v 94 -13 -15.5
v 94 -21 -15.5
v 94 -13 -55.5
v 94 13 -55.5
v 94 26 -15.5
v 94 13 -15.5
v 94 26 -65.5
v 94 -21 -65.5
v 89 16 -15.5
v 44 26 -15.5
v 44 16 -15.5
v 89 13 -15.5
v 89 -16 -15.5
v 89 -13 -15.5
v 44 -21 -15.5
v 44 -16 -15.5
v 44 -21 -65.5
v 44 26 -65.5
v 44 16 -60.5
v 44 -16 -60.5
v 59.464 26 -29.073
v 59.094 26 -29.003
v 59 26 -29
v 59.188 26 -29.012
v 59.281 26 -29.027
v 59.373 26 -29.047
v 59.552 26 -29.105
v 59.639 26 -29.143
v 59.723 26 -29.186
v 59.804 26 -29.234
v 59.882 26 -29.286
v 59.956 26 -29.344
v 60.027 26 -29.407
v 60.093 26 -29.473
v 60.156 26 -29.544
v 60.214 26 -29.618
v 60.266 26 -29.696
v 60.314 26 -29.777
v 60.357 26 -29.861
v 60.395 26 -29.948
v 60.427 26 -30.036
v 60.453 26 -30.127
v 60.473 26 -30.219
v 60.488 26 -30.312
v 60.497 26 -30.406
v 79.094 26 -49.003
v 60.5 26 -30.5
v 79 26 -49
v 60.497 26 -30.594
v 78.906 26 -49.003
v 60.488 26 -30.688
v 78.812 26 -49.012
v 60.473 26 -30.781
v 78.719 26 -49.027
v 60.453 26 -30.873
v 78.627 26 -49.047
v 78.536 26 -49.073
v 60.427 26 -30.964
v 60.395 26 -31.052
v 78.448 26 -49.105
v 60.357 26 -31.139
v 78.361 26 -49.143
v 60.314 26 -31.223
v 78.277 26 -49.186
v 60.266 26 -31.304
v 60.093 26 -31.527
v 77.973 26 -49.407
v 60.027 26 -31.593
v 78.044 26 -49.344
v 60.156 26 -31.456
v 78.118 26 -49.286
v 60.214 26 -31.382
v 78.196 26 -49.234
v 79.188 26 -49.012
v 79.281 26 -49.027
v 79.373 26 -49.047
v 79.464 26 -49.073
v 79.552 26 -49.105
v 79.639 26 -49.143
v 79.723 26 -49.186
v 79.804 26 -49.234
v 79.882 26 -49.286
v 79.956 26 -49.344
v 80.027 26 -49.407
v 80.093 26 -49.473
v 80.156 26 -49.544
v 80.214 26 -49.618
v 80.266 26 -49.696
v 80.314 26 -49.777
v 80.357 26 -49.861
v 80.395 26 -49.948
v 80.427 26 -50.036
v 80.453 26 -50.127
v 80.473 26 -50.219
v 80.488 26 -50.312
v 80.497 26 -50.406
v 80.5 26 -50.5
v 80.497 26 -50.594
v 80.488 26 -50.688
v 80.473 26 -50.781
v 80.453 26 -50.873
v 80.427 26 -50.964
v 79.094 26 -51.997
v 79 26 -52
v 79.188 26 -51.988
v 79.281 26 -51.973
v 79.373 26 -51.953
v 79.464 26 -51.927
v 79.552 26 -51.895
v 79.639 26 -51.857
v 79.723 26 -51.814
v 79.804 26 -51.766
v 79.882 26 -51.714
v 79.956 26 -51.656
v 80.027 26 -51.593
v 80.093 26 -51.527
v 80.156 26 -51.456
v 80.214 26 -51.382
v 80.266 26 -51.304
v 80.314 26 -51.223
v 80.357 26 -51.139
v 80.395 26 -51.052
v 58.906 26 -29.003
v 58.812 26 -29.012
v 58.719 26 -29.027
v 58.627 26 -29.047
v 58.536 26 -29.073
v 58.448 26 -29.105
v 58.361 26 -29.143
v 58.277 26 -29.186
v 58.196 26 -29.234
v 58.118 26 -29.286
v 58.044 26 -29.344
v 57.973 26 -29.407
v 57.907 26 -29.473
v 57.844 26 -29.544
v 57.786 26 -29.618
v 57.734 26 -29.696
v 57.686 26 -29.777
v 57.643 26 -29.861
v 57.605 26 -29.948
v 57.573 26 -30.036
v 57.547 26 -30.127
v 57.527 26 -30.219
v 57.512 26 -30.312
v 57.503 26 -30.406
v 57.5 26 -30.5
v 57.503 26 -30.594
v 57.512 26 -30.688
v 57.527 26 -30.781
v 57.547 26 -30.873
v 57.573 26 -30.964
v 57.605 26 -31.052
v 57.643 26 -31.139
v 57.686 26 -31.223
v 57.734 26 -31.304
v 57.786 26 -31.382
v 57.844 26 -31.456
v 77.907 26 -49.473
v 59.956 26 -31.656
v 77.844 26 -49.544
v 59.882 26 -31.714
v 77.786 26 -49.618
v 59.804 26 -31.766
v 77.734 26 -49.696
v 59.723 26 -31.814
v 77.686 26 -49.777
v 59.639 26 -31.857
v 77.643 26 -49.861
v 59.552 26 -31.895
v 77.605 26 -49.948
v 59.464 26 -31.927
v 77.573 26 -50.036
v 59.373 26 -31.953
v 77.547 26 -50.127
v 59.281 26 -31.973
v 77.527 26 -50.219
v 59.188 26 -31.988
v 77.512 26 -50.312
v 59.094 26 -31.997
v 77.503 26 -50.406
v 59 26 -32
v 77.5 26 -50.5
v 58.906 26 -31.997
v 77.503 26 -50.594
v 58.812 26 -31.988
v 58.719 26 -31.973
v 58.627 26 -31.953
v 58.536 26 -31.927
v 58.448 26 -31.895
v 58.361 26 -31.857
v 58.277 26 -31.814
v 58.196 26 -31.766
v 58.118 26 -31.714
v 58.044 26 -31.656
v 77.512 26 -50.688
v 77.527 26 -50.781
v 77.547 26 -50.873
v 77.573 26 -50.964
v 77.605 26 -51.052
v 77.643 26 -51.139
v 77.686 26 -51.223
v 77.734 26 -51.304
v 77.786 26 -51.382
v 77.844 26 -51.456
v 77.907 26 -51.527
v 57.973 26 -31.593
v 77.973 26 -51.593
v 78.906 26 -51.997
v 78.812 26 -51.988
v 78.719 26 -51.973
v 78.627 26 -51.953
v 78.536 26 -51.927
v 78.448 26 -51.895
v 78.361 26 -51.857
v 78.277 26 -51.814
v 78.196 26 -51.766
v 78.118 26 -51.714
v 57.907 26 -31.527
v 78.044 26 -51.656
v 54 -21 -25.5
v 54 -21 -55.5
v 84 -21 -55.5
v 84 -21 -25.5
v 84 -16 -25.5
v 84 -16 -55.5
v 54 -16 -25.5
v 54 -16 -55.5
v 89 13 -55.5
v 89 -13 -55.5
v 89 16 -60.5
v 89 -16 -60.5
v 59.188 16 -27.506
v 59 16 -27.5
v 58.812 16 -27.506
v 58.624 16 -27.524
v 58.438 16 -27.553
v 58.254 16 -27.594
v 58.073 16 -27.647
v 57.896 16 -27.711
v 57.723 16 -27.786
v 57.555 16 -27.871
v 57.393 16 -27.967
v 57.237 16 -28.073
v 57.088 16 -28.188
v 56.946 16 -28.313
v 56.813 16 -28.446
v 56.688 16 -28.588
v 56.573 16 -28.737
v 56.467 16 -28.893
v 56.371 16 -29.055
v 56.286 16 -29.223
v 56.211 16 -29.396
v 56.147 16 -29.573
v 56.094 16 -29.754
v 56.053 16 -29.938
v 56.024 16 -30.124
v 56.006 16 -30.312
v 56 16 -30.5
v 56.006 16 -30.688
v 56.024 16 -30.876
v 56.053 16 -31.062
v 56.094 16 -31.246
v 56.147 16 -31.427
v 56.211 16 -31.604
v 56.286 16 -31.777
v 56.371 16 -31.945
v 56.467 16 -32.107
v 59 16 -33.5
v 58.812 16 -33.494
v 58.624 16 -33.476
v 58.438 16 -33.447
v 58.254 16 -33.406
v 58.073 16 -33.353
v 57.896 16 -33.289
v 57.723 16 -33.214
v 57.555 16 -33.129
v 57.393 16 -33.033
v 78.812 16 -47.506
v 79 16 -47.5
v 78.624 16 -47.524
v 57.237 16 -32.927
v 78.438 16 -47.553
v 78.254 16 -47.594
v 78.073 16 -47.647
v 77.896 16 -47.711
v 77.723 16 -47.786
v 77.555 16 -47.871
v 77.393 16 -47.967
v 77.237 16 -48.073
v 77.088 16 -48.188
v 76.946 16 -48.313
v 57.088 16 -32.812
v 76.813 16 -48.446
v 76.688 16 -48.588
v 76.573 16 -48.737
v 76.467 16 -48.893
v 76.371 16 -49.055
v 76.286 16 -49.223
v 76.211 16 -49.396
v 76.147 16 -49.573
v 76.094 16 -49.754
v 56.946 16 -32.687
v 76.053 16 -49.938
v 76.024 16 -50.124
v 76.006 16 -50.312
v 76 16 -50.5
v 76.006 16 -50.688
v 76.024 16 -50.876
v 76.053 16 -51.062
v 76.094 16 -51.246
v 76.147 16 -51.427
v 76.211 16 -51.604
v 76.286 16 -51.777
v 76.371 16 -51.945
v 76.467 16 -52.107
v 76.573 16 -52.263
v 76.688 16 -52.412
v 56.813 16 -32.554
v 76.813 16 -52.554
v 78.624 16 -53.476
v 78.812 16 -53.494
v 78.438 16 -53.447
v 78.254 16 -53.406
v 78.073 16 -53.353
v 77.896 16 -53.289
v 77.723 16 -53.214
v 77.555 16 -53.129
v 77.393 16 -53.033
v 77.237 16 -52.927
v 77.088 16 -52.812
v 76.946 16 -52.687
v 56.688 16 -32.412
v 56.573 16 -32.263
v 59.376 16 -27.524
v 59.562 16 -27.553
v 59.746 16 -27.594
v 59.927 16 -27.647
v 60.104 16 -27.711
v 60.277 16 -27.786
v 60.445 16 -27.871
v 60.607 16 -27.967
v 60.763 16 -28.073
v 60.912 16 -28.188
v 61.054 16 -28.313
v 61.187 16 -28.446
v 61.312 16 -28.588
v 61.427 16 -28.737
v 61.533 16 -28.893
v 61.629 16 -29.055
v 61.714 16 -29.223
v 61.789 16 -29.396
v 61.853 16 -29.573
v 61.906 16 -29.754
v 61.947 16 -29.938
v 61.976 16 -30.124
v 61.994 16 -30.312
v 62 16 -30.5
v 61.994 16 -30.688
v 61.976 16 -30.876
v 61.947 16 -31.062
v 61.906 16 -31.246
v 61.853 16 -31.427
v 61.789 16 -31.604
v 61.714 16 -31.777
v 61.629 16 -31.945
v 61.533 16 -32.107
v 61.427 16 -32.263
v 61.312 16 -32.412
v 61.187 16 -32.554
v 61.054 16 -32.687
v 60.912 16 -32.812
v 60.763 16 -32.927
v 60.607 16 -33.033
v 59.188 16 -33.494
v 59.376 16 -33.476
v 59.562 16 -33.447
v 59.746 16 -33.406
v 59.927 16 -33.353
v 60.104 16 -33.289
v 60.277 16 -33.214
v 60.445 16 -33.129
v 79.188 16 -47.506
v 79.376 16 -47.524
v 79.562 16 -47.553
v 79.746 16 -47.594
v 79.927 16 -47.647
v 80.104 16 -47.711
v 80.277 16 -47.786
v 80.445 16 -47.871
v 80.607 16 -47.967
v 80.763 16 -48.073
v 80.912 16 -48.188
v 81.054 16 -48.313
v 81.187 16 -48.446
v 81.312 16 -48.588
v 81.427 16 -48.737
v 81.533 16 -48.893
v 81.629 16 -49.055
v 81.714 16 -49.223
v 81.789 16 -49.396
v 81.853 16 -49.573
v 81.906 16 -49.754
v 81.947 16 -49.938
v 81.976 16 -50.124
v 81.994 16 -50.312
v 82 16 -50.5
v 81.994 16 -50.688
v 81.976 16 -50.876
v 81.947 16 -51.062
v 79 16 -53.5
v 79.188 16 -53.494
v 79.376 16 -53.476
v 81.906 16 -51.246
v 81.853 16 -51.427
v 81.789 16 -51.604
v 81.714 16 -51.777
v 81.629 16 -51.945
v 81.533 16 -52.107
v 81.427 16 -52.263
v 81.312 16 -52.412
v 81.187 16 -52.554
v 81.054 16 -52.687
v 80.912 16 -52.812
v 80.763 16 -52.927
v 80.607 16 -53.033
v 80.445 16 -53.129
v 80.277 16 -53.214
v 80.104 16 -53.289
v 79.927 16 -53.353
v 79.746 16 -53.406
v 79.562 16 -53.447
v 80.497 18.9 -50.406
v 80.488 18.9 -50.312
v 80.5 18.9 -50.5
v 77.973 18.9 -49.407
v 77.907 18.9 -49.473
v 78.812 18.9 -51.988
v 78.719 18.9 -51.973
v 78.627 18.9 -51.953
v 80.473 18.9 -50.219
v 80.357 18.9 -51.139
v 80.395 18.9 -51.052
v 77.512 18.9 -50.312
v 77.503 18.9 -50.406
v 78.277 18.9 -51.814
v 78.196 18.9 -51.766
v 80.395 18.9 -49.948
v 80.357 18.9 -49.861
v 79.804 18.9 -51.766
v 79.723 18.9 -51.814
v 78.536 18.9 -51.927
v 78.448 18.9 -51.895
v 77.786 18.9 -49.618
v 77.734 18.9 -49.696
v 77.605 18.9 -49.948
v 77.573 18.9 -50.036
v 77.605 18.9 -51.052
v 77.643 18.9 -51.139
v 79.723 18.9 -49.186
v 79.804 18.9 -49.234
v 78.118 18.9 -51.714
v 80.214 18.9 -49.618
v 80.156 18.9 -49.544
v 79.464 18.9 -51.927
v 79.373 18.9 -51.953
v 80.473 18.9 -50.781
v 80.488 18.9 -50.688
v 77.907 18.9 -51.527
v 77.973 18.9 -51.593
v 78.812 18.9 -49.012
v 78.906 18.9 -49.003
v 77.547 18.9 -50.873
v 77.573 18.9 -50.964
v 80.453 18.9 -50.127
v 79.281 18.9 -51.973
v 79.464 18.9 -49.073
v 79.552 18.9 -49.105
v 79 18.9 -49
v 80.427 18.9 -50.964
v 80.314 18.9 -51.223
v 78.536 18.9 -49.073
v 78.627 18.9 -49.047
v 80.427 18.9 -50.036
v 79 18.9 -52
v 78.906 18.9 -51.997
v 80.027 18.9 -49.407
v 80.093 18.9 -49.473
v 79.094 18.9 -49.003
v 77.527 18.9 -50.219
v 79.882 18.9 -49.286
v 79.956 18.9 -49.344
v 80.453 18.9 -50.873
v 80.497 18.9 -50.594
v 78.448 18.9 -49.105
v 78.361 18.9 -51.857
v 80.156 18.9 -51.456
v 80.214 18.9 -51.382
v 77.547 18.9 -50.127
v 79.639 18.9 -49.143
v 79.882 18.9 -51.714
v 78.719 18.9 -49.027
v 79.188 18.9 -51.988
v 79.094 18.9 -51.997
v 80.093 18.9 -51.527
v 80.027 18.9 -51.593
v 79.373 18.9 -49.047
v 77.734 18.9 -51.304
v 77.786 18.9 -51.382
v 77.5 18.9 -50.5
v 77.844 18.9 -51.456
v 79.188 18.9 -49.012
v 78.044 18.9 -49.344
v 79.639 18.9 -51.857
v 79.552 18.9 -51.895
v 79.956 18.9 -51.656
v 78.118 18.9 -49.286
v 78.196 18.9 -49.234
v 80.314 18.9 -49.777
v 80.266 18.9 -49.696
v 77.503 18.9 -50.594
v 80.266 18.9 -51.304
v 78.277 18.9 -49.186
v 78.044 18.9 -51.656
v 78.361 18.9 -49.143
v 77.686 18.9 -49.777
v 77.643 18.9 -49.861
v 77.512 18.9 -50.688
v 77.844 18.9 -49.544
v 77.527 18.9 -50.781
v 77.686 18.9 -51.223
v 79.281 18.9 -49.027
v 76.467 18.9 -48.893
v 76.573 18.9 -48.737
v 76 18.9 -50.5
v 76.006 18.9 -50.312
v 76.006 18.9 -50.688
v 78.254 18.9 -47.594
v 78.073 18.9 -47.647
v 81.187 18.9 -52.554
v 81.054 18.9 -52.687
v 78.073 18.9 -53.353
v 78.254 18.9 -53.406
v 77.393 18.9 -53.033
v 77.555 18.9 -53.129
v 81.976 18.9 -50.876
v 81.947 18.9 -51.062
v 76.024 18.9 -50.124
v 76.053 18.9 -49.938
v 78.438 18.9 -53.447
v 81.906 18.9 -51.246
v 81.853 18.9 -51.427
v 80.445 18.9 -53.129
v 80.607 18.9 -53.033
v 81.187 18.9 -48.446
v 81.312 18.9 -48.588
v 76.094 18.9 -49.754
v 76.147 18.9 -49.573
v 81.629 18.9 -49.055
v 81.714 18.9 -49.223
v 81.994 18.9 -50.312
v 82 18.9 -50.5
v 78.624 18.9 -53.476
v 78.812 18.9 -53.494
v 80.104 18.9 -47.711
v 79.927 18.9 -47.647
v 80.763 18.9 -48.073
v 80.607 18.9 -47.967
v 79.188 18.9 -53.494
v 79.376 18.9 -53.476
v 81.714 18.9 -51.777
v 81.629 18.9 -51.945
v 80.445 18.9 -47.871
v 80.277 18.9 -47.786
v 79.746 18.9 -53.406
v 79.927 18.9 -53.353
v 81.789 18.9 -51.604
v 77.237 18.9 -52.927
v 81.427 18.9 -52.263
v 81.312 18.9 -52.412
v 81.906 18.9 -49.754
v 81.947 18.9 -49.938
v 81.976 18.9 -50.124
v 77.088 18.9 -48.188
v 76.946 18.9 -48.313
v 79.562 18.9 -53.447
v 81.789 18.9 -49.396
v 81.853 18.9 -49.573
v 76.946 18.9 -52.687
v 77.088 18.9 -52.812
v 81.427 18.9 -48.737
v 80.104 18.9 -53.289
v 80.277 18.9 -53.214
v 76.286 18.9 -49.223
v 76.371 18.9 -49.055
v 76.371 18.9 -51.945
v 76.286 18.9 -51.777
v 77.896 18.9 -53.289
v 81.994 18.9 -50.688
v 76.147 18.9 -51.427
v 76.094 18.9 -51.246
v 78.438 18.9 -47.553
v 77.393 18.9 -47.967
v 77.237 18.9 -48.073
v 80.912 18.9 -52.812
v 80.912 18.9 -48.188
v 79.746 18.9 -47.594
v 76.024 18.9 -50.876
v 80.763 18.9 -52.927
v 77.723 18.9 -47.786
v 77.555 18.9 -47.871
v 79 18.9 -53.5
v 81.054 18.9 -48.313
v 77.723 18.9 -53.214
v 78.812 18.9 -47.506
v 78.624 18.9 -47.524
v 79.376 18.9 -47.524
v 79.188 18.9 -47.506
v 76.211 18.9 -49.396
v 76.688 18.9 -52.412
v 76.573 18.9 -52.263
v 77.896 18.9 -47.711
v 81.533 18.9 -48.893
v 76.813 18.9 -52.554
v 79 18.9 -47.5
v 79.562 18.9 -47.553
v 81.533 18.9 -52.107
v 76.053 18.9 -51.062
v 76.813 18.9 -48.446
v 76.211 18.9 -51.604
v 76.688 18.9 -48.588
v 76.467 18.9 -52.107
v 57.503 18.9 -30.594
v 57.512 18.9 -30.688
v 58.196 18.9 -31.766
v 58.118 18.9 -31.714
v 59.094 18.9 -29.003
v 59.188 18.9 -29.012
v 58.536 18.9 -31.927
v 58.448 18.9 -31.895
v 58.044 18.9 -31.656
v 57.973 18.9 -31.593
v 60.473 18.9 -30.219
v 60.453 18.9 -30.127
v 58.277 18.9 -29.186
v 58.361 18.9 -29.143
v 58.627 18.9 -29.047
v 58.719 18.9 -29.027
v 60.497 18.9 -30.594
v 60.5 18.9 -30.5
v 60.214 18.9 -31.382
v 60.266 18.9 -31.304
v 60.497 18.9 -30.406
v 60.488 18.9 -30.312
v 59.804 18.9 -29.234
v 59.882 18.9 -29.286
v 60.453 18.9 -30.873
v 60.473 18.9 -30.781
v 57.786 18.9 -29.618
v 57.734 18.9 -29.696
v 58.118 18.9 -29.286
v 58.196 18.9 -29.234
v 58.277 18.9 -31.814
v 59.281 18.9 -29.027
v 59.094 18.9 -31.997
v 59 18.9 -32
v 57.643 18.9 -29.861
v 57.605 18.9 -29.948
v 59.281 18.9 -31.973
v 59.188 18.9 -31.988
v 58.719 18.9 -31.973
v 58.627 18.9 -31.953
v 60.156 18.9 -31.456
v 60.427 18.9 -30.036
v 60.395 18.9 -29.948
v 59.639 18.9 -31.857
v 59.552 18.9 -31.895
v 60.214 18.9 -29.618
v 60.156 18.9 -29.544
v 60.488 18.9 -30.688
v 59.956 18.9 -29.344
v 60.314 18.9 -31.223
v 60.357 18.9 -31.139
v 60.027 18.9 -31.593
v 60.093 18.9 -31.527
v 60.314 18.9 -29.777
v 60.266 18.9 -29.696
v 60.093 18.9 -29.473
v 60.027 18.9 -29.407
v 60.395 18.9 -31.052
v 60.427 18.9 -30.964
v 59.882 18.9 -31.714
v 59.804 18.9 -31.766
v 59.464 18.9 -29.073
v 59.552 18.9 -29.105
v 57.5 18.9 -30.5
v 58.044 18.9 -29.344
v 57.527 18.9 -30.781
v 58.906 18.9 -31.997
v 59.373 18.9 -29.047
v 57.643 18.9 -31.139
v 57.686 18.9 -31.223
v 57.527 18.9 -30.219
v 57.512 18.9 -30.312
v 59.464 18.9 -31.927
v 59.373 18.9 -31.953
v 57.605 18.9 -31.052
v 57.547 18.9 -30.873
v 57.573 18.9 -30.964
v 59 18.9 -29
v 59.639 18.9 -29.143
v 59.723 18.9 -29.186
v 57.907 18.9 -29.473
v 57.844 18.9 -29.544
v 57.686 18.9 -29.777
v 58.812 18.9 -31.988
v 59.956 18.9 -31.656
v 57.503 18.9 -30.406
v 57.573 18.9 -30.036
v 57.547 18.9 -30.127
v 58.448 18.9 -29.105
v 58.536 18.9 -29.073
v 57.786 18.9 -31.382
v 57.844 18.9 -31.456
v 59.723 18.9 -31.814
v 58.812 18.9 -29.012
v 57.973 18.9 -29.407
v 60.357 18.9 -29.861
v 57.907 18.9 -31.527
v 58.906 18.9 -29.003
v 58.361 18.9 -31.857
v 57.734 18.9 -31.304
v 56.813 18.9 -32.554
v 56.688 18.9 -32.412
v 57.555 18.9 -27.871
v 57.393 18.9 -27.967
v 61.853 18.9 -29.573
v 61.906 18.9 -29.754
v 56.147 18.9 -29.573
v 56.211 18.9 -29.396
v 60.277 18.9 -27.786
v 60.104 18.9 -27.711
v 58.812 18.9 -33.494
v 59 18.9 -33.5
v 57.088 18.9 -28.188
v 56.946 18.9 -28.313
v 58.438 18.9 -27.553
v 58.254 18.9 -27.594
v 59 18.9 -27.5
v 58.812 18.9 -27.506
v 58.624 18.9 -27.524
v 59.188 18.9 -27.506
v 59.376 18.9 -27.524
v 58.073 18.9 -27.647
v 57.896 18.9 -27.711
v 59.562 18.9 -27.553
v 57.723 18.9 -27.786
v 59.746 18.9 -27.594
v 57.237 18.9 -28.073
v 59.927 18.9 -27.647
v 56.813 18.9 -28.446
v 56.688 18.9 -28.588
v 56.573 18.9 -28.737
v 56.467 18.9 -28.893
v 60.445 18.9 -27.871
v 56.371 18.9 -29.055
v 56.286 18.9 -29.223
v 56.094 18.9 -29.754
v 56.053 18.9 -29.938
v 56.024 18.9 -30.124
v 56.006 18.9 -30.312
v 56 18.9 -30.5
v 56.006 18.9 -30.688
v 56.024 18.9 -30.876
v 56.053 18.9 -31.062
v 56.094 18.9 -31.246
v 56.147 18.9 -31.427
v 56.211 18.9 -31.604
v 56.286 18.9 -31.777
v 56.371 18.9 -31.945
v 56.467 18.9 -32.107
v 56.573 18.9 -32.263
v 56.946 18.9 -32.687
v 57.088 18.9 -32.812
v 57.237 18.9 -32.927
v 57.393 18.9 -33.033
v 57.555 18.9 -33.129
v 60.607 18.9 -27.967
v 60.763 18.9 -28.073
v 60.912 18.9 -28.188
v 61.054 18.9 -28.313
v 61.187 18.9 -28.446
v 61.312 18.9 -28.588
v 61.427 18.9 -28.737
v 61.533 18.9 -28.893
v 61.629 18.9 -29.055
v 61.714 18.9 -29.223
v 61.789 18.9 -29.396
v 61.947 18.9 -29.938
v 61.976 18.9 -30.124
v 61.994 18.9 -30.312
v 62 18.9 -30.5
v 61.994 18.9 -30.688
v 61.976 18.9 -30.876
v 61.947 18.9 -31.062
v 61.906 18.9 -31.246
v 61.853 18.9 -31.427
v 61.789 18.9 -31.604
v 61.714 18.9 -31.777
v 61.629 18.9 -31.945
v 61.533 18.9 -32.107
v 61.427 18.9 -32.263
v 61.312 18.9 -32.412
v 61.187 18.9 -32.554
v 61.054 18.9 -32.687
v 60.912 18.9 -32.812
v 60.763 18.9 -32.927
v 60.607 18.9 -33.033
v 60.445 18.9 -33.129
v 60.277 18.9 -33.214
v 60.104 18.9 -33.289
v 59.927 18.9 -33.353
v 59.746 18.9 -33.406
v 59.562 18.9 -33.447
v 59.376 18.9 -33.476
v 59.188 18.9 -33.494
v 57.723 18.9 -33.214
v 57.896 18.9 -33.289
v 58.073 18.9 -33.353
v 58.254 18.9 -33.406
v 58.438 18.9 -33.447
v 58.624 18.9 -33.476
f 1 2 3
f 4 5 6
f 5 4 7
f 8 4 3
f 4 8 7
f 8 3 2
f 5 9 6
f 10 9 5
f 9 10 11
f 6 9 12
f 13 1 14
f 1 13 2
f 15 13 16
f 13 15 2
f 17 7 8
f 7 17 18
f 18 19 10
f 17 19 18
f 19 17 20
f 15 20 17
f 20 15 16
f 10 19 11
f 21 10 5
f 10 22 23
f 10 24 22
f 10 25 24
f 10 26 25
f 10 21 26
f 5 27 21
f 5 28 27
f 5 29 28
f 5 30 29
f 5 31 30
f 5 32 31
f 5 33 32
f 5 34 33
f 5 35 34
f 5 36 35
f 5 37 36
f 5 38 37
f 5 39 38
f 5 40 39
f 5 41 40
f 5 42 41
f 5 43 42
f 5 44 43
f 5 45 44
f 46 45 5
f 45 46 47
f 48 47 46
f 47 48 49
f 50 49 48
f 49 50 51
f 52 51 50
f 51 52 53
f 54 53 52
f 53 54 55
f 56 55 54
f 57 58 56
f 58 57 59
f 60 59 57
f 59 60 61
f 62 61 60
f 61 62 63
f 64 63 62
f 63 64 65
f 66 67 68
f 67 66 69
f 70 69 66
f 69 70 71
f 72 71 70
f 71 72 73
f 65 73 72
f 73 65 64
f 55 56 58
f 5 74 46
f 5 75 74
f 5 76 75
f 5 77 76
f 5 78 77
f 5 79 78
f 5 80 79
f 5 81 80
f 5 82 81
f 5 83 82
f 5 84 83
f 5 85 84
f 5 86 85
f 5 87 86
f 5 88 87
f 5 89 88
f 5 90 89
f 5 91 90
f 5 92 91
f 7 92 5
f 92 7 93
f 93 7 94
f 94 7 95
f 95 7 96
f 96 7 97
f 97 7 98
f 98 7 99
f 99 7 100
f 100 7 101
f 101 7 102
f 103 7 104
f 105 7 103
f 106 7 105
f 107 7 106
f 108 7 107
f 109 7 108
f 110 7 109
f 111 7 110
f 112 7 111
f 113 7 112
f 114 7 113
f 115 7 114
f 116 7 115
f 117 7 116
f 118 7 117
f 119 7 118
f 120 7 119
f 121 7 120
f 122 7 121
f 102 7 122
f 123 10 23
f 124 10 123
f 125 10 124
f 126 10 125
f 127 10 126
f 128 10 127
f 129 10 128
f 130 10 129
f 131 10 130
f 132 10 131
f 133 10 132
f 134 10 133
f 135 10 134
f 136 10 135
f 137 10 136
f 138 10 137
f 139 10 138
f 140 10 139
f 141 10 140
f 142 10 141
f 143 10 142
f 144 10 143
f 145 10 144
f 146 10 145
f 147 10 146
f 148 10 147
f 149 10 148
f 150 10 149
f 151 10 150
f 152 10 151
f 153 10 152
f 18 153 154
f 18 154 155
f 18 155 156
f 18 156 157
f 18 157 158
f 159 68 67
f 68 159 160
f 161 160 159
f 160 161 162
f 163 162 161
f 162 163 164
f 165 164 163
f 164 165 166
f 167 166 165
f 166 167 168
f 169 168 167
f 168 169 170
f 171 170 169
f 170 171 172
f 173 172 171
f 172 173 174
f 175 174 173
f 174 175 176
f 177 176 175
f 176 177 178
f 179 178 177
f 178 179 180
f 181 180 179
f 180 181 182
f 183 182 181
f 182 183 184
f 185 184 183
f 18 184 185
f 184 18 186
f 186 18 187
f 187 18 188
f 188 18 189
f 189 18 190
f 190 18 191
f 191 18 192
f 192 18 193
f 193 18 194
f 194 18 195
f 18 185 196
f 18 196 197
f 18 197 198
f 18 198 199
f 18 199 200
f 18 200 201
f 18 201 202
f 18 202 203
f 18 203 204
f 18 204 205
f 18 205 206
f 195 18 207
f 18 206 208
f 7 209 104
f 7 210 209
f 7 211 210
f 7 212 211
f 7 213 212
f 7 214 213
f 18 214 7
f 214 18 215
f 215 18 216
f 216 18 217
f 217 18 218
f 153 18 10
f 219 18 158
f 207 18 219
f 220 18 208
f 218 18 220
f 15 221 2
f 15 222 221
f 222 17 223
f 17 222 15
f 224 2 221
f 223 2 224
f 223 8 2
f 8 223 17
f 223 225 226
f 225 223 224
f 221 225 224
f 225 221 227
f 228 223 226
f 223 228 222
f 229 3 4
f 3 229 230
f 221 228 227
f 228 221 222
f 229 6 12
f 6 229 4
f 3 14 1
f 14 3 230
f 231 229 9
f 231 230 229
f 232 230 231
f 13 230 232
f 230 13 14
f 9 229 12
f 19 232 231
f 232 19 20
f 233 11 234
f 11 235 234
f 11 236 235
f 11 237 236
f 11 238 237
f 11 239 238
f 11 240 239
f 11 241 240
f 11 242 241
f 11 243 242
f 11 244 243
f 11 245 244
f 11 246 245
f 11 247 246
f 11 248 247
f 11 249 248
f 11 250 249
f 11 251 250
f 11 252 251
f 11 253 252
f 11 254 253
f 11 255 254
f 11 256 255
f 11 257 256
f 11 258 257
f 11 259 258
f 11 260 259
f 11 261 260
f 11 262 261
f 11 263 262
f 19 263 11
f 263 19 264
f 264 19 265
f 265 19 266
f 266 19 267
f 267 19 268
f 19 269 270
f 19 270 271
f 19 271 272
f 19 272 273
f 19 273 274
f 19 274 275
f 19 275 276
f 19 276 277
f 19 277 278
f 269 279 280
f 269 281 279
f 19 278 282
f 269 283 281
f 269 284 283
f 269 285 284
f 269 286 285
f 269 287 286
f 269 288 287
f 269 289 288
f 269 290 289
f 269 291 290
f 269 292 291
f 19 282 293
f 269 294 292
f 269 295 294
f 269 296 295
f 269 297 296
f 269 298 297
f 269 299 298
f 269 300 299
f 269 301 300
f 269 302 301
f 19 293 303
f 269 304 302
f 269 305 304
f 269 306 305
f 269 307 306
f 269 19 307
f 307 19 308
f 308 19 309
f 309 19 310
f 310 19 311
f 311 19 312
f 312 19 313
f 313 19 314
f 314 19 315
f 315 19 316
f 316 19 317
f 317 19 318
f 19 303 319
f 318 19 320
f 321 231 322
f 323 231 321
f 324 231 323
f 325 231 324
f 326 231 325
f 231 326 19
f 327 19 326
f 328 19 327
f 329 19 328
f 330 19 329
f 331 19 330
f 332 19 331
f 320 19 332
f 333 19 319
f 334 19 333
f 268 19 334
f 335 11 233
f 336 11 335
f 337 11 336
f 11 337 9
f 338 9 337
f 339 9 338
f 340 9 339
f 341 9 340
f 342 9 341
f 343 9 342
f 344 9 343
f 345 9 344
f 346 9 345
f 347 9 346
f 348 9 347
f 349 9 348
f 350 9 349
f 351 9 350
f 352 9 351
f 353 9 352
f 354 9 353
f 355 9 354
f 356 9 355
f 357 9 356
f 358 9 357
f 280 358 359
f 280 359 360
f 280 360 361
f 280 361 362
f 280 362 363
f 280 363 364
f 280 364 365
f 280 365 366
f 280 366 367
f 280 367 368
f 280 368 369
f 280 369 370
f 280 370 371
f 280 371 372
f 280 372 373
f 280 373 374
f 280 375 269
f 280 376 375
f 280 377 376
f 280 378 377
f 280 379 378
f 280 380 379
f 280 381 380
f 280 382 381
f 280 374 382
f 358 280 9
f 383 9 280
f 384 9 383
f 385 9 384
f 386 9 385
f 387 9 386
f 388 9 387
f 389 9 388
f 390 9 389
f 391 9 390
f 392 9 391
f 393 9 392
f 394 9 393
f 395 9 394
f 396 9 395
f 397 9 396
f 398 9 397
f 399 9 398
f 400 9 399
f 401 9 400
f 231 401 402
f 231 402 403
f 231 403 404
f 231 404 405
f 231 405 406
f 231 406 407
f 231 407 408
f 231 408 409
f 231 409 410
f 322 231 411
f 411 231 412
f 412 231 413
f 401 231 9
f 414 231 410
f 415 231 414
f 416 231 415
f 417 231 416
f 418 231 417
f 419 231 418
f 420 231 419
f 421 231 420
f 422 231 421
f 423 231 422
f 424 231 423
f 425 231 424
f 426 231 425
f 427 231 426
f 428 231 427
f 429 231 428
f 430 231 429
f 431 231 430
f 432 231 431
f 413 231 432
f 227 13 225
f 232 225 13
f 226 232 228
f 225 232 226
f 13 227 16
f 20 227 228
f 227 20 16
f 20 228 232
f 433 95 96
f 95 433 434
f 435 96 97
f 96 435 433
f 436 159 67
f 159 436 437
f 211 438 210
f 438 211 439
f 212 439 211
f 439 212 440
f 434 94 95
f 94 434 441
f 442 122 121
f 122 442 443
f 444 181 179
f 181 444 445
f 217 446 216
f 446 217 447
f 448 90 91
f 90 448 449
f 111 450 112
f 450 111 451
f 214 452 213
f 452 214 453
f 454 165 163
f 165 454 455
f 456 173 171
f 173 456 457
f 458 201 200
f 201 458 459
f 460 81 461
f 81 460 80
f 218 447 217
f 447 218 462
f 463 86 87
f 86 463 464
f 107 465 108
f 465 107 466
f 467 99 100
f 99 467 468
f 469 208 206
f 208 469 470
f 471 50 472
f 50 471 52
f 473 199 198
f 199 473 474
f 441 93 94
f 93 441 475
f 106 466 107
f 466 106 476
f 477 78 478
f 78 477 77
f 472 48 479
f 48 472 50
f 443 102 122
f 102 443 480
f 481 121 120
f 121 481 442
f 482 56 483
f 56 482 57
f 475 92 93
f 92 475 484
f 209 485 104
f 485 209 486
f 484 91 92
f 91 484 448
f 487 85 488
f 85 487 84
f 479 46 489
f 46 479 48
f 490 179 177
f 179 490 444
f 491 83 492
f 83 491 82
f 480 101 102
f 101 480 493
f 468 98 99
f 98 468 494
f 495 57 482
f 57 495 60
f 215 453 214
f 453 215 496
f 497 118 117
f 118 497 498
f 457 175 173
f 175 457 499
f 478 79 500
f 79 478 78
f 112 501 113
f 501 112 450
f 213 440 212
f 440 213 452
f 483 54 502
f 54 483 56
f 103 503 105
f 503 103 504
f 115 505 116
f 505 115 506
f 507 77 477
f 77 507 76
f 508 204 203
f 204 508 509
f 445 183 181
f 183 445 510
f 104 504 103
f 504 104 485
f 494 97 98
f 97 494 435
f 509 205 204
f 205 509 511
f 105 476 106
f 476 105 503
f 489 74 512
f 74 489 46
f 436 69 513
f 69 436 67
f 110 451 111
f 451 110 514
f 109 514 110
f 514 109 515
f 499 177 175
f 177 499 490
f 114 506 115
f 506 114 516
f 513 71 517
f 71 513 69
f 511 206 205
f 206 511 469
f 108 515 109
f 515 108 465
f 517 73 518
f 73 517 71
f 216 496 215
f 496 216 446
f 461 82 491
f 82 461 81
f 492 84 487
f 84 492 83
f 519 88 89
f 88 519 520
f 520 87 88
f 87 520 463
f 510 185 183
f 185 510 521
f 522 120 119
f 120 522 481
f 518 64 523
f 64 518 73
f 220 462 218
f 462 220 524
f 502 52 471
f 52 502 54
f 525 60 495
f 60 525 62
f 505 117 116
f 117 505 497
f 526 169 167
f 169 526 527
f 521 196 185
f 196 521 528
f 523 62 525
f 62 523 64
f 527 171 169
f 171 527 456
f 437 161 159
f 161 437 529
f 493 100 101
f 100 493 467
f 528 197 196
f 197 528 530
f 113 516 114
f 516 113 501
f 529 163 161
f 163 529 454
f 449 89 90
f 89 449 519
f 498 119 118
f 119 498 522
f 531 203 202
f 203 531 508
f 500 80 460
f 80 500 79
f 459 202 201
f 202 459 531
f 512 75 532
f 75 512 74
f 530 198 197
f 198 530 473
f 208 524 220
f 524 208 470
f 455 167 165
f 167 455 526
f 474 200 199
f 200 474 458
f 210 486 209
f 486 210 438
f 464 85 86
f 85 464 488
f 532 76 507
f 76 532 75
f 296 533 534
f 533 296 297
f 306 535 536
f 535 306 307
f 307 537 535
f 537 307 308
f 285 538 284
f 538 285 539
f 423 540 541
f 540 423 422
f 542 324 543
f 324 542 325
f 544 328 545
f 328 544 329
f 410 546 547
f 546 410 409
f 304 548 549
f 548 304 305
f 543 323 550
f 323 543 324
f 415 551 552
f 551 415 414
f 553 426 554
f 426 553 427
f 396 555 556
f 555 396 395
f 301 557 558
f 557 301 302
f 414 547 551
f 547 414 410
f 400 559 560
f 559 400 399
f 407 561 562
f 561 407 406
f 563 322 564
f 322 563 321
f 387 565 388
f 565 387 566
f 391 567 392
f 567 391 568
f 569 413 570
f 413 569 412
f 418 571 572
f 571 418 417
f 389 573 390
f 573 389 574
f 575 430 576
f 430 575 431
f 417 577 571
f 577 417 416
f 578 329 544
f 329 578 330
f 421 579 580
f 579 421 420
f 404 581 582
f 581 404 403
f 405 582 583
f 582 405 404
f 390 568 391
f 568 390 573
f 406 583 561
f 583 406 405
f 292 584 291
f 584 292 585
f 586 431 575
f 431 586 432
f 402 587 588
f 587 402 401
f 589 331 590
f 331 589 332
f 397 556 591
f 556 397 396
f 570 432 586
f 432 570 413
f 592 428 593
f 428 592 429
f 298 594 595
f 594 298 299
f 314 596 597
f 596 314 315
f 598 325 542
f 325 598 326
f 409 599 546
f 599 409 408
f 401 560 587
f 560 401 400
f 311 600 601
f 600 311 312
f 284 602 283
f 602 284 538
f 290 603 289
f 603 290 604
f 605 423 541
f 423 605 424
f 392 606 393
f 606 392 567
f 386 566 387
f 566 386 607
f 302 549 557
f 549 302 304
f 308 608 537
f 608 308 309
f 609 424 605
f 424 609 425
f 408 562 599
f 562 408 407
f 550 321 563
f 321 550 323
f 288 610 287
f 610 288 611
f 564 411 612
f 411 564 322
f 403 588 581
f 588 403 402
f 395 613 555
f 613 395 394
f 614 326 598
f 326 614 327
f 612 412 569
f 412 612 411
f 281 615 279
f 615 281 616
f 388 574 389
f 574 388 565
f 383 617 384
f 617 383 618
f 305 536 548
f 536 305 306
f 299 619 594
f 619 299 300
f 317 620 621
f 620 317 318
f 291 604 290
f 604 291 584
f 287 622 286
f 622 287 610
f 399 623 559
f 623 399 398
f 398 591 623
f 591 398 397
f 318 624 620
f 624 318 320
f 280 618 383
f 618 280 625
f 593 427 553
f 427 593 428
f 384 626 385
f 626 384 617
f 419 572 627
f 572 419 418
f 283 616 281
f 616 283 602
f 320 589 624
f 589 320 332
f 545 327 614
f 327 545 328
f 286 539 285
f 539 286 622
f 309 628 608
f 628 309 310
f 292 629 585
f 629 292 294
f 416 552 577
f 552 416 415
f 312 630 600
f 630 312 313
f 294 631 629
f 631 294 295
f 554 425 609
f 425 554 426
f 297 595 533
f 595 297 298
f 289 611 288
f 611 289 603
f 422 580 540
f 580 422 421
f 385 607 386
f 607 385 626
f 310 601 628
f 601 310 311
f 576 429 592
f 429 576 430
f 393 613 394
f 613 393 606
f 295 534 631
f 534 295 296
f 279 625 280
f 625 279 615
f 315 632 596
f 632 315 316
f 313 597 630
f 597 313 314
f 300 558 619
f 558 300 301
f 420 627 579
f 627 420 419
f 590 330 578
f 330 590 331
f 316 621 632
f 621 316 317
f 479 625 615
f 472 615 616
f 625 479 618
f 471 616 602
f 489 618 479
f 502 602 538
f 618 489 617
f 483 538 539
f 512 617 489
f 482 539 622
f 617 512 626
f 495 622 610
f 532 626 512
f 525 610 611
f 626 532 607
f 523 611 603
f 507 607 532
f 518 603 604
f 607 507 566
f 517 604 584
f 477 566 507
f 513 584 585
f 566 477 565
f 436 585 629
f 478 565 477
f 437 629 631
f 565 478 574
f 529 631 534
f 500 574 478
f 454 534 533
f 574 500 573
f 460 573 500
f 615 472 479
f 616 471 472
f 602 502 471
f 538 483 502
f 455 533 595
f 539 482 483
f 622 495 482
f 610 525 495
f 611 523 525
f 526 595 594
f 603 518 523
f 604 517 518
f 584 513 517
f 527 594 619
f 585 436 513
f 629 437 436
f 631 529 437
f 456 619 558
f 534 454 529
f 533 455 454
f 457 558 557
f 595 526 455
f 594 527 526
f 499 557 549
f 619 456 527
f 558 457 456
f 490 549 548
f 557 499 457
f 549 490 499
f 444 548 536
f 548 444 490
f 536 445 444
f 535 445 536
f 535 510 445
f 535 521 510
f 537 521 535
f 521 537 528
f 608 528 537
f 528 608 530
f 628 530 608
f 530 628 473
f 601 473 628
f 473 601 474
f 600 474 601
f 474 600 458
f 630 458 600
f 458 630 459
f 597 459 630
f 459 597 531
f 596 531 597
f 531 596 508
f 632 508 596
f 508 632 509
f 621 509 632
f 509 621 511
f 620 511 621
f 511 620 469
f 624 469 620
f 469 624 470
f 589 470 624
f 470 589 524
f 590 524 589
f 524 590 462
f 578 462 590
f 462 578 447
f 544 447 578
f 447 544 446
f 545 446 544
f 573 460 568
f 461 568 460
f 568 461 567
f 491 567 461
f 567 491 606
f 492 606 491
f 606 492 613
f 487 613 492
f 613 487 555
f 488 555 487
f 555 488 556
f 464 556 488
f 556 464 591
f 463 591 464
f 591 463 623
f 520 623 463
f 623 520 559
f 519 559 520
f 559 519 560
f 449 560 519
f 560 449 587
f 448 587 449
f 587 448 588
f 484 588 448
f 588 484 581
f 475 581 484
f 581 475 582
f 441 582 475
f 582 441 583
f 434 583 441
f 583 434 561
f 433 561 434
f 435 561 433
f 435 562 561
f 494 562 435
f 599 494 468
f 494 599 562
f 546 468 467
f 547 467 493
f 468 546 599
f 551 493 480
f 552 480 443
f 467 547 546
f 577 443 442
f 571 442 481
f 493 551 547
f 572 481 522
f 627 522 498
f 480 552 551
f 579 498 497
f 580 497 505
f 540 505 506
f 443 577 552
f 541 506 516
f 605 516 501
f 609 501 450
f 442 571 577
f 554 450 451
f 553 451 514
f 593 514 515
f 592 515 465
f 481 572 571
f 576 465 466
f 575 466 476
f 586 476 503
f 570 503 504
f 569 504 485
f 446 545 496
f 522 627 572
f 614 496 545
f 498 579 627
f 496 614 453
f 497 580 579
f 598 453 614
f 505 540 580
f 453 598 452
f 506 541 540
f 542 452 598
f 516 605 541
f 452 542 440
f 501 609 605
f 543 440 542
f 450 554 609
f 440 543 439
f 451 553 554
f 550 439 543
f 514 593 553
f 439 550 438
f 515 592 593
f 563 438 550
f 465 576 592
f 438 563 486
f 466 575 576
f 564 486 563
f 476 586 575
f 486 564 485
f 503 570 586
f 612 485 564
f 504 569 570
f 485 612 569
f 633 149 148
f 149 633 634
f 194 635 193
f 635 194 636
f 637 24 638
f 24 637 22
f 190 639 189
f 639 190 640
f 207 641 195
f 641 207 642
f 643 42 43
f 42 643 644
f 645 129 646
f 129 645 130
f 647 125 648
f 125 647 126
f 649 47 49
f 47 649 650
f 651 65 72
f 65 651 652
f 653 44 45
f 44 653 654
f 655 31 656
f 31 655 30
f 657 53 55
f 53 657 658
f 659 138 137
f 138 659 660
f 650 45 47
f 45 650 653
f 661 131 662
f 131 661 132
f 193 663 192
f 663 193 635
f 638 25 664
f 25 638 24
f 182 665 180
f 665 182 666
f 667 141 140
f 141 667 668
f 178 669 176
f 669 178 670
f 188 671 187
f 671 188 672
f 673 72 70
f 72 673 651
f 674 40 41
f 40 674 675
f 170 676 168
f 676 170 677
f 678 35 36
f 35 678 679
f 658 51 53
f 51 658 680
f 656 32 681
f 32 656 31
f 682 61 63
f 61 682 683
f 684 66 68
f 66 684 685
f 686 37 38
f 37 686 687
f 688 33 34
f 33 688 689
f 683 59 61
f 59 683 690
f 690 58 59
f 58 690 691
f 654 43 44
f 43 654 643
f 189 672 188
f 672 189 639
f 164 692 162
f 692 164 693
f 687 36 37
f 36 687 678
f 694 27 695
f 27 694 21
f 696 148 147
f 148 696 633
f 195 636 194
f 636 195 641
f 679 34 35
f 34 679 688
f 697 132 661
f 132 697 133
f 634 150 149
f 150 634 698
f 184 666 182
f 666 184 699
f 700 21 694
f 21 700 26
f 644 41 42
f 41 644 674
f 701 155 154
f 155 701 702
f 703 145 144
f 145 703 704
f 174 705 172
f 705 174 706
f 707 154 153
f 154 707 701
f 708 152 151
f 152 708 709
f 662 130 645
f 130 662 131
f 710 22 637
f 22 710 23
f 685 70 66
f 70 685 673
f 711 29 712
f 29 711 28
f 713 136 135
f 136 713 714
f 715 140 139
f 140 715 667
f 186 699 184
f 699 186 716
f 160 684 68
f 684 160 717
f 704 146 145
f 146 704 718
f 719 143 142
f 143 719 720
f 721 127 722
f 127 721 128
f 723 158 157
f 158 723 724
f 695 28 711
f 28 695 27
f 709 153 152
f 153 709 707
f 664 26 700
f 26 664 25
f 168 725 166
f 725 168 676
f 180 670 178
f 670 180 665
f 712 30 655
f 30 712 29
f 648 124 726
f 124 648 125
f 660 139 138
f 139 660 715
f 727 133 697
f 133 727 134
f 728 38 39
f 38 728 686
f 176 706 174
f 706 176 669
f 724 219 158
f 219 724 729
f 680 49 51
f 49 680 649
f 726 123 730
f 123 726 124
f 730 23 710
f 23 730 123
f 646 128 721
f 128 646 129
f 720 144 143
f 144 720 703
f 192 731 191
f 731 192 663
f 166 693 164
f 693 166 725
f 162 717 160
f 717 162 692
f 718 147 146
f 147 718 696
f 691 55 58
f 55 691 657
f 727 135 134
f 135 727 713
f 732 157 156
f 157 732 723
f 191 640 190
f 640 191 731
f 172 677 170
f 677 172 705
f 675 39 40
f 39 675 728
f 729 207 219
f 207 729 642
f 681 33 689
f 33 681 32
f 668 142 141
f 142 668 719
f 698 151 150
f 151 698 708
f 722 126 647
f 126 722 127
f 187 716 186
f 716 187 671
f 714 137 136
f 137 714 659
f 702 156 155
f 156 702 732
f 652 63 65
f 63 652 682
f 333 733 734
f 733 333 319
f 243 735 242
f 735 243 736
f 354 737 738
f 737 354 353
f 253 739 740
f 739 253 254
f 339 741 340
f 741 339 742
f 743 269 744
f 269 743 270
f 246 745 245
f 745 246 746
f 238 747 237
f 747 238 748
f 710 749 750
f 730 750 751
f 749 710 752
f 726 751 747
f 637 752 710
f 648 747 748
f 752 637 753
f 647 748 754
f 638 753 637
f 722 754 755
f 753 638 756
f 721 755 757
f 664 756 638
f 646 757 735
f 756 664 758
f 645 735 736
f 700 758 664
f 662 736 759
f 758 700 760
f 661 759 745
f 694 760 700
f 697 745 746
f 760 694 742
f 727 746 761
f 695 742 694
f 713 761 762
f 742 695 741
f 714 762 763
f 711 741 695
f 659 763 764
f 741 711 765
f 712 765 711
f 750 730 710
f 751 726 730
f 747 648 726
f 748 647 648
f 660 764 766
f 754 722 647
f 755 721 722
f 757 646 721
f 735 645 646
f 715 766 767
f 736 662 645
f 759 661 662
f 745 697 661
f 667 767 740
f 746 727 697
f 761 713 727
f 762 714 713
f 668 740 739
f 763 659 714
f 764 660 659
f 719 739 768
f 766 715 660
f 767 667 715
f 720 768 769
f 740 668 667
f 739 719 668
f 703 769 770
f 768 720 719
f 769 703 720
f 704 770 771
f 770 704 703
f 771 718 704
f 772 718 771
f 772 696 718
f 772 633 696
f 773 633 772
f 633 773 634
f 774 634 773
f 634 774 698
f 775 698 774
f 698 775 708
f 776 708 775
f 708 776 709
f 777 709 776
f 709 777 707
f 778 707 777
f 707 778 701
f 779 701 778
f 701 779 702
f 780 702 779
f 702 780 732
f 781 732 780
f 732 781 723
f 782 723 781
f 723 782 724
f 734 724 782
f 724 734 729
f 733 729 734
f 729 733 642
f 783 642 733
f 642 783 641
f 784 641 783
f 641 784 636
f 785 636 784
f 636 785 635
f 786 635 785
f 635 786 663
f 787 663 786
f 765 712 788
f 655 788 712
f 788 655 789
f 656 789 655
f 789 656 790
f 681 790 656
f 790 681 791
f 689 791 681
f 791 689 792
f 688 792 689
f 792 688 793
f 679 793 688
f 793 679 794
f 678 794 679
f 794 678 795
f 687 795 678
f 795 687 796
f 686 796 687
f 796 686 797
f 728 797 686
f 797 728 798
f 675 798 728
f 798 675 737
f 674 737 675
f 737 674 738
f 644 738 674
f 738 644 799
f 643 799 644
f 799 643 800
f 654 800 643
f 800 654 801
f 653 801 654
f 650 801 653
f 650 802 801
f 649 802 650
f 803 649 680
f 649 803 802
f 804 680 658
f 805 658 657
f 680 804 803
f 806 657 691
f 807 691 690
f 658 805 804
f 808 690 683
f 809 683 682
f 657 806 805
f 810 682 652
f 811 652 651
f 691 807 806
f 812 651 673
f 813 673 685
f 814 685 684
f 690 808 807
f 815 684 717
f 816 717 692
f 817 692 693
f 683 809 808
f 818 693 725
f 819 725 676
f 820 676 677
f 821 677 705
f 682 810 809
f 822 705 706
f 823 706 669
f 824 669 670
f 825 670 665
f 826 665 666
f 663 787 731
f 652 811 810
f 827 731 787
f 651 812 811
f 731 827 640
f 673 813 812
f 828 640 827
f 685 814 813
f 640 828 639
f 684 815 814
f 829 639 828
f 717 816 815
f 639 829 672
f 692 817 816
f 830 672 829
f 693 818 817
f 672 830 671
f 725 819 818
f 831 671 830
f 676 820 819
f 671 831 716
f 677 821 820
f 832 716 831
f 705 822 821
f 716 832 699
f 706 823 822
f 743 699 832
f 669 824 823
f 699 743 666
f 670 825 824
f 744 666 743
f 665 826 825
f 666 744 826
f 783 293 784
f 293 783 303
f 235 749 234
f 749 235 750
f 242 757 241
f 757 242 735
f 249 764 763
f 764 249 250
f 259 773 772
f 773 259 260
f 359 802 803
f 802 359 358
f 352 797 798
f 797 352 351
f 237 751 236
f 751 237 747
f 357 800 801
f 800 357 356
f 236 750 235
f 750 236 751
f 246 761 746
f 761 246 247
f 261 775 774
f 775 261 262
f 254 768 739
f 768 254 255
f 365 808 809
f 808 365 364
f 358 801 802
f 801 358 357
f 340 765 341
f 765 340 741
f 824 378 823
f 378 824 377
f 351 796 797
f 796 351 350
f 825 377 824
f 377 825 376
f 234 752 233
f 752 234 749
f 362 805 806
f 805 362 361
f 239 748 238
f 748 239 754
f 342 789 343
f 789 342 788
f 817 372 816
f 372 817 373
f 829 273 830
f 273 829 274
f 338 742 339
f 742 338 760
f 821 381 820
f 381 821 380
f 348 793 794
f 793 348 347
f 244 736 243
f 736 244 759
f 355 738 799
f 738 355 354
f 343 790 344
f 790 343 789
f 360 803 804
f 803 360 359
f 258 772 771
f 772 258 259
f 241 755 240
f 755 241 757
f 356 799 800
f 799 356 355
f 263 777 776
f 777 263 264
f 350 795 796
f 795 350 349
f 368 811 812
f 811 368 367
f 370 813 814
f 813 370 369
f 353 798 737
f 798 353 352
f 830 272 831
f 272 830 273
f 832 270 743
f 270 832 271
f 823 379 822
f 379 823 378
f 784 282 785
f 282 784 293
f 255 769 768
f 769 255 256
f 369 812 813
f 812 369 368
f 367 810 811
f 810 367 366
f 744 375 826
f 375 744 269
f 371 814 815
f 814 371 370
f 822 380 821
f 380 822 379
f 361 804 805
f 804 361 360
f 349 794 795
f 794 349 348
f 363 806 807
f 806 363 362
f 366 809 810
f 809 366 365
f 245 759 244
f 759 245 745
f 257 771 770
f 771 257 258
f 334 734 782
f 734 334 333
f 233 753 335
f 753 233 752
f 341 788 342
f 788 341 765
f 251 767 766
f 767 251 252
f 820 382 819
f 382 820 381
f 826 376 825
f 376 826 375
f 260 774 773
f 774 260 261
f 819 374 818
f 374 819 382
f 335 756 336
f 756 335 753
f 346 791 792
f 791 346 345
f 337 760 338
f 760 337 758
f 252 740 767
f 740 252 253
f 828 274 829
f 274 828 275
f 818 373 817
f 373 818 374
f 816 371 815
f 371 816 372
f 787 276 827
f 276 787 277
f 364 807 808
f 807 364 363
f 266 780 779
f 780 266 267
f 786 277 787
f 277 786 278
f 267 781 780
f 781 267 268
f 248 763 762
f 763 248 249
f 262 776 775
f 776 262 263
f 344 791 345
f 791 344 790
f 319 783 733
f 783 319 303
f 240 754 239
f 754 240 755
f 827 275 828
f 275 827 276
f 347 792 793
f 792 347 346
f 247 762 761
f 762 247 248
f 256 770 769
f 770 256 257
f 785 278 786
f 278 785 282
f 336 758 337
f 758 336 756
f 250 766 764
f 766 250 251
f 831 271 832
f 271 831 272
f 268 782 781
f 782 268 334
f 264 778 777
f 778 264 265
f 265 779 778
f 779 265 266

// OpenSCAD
// file: shanqiu-ups-fx-5-12-pro-ac.scad
// Wall mount corner for Shanqiu UPS FX 5-12Pro-AC
// https://hgdups.com/product-13896-13942-36287.html

ups_depth = 32;
ups_height = 178;
ups_width = 121;

ups_depth_h = ups_depth / 2;
ups_height_h = ups_height / 2;
ups_width_h = ups_width / 2;

module shanqiu_ups(show, color="blue") {
	if (show) {
		color(color) cube([ups_height, ups_depth, ups_width], center=true);
	}
}
// main file
// Wall mount corner for Shanqiu UPS FX 5-12Pro-AC
// https://hgdups.com/product-13896-13942-36287.html

include <shanqiu-ups-fx-5-12-pro-ac.scad>

shanqiu_ups($preview);

box_color = "green";
box_cont = 10;
box_depth_pad = 0;

ups_border_sep = 6;
ups_wall_sep = 10;
ups_wall_sep_add = ups_wall_sep - box_cont / 2;

box_depth = ups_depth + box_depth_pad + box_cont;
box_height = 50;
box_width = 50;

box_cont_h = box_cont / 2;
box_depth_h = box_depth / 2;
box_height_h = box_height / 2;
box_width_h = box_width / 2;

difference() {
    translate([(ups_height_h - box_height_h + box_cont_h), ups_wall_sep_add / 2, -(ups_width_h - box_width_h + box_cont_h)]) union() {
        color(box_color) difference() {
            cube([box_width, box_depth + ups_wall_sep_add, box_height], center=true);
            translate([0, -ups_wall_sep_add * 2 - box_cont, 0]) cube([box_width - box_cont * 2, box_depth + box_cont, box_height - box_cont * 2], center=true);
            translate([ups_wall_sep, -ups_wall_sep_add / 2, box_cont]) cube([box_width, box_depth - ups_border_sep - box_cont, box_height], center=true);
        }
    }

    shanqiu_ups(true, box_color);

    translate([(ups_height_h - box_cont), ups_depth_h + ups_wall_sep_add, -ups_width_h + box_cont]) rotate([90, 0, 0]) cylinder(ups_wall_sep + 1, d=3, center=true, $fn=100);
    translate([(ups_height_h - box_cont), ups_depth_h + 1.4, -ups_width_h + box_cont]) rotate([90, 0, 0]) cylinder(3, d=6, center=true, $fn=100);

    translate([(ups_height_h - box_height + box_cont * 2), ups_depth_h + ups_wall_sep_add, -ups_width_h + box_width - box_cont * 2]) rotate([90, 0, 0]) cylinder(ups_wall_sep + 1, d=3, center=true, $fn=100);
    translate([(ups_height_h - box_height + box_cont * 2), ups_depth_h + 1.4, -ups_width_h + box_width - box_cont * 2]) rotate([90, 0, 0]) cylinder(3, d=6, center=true, $fn=100);
}
